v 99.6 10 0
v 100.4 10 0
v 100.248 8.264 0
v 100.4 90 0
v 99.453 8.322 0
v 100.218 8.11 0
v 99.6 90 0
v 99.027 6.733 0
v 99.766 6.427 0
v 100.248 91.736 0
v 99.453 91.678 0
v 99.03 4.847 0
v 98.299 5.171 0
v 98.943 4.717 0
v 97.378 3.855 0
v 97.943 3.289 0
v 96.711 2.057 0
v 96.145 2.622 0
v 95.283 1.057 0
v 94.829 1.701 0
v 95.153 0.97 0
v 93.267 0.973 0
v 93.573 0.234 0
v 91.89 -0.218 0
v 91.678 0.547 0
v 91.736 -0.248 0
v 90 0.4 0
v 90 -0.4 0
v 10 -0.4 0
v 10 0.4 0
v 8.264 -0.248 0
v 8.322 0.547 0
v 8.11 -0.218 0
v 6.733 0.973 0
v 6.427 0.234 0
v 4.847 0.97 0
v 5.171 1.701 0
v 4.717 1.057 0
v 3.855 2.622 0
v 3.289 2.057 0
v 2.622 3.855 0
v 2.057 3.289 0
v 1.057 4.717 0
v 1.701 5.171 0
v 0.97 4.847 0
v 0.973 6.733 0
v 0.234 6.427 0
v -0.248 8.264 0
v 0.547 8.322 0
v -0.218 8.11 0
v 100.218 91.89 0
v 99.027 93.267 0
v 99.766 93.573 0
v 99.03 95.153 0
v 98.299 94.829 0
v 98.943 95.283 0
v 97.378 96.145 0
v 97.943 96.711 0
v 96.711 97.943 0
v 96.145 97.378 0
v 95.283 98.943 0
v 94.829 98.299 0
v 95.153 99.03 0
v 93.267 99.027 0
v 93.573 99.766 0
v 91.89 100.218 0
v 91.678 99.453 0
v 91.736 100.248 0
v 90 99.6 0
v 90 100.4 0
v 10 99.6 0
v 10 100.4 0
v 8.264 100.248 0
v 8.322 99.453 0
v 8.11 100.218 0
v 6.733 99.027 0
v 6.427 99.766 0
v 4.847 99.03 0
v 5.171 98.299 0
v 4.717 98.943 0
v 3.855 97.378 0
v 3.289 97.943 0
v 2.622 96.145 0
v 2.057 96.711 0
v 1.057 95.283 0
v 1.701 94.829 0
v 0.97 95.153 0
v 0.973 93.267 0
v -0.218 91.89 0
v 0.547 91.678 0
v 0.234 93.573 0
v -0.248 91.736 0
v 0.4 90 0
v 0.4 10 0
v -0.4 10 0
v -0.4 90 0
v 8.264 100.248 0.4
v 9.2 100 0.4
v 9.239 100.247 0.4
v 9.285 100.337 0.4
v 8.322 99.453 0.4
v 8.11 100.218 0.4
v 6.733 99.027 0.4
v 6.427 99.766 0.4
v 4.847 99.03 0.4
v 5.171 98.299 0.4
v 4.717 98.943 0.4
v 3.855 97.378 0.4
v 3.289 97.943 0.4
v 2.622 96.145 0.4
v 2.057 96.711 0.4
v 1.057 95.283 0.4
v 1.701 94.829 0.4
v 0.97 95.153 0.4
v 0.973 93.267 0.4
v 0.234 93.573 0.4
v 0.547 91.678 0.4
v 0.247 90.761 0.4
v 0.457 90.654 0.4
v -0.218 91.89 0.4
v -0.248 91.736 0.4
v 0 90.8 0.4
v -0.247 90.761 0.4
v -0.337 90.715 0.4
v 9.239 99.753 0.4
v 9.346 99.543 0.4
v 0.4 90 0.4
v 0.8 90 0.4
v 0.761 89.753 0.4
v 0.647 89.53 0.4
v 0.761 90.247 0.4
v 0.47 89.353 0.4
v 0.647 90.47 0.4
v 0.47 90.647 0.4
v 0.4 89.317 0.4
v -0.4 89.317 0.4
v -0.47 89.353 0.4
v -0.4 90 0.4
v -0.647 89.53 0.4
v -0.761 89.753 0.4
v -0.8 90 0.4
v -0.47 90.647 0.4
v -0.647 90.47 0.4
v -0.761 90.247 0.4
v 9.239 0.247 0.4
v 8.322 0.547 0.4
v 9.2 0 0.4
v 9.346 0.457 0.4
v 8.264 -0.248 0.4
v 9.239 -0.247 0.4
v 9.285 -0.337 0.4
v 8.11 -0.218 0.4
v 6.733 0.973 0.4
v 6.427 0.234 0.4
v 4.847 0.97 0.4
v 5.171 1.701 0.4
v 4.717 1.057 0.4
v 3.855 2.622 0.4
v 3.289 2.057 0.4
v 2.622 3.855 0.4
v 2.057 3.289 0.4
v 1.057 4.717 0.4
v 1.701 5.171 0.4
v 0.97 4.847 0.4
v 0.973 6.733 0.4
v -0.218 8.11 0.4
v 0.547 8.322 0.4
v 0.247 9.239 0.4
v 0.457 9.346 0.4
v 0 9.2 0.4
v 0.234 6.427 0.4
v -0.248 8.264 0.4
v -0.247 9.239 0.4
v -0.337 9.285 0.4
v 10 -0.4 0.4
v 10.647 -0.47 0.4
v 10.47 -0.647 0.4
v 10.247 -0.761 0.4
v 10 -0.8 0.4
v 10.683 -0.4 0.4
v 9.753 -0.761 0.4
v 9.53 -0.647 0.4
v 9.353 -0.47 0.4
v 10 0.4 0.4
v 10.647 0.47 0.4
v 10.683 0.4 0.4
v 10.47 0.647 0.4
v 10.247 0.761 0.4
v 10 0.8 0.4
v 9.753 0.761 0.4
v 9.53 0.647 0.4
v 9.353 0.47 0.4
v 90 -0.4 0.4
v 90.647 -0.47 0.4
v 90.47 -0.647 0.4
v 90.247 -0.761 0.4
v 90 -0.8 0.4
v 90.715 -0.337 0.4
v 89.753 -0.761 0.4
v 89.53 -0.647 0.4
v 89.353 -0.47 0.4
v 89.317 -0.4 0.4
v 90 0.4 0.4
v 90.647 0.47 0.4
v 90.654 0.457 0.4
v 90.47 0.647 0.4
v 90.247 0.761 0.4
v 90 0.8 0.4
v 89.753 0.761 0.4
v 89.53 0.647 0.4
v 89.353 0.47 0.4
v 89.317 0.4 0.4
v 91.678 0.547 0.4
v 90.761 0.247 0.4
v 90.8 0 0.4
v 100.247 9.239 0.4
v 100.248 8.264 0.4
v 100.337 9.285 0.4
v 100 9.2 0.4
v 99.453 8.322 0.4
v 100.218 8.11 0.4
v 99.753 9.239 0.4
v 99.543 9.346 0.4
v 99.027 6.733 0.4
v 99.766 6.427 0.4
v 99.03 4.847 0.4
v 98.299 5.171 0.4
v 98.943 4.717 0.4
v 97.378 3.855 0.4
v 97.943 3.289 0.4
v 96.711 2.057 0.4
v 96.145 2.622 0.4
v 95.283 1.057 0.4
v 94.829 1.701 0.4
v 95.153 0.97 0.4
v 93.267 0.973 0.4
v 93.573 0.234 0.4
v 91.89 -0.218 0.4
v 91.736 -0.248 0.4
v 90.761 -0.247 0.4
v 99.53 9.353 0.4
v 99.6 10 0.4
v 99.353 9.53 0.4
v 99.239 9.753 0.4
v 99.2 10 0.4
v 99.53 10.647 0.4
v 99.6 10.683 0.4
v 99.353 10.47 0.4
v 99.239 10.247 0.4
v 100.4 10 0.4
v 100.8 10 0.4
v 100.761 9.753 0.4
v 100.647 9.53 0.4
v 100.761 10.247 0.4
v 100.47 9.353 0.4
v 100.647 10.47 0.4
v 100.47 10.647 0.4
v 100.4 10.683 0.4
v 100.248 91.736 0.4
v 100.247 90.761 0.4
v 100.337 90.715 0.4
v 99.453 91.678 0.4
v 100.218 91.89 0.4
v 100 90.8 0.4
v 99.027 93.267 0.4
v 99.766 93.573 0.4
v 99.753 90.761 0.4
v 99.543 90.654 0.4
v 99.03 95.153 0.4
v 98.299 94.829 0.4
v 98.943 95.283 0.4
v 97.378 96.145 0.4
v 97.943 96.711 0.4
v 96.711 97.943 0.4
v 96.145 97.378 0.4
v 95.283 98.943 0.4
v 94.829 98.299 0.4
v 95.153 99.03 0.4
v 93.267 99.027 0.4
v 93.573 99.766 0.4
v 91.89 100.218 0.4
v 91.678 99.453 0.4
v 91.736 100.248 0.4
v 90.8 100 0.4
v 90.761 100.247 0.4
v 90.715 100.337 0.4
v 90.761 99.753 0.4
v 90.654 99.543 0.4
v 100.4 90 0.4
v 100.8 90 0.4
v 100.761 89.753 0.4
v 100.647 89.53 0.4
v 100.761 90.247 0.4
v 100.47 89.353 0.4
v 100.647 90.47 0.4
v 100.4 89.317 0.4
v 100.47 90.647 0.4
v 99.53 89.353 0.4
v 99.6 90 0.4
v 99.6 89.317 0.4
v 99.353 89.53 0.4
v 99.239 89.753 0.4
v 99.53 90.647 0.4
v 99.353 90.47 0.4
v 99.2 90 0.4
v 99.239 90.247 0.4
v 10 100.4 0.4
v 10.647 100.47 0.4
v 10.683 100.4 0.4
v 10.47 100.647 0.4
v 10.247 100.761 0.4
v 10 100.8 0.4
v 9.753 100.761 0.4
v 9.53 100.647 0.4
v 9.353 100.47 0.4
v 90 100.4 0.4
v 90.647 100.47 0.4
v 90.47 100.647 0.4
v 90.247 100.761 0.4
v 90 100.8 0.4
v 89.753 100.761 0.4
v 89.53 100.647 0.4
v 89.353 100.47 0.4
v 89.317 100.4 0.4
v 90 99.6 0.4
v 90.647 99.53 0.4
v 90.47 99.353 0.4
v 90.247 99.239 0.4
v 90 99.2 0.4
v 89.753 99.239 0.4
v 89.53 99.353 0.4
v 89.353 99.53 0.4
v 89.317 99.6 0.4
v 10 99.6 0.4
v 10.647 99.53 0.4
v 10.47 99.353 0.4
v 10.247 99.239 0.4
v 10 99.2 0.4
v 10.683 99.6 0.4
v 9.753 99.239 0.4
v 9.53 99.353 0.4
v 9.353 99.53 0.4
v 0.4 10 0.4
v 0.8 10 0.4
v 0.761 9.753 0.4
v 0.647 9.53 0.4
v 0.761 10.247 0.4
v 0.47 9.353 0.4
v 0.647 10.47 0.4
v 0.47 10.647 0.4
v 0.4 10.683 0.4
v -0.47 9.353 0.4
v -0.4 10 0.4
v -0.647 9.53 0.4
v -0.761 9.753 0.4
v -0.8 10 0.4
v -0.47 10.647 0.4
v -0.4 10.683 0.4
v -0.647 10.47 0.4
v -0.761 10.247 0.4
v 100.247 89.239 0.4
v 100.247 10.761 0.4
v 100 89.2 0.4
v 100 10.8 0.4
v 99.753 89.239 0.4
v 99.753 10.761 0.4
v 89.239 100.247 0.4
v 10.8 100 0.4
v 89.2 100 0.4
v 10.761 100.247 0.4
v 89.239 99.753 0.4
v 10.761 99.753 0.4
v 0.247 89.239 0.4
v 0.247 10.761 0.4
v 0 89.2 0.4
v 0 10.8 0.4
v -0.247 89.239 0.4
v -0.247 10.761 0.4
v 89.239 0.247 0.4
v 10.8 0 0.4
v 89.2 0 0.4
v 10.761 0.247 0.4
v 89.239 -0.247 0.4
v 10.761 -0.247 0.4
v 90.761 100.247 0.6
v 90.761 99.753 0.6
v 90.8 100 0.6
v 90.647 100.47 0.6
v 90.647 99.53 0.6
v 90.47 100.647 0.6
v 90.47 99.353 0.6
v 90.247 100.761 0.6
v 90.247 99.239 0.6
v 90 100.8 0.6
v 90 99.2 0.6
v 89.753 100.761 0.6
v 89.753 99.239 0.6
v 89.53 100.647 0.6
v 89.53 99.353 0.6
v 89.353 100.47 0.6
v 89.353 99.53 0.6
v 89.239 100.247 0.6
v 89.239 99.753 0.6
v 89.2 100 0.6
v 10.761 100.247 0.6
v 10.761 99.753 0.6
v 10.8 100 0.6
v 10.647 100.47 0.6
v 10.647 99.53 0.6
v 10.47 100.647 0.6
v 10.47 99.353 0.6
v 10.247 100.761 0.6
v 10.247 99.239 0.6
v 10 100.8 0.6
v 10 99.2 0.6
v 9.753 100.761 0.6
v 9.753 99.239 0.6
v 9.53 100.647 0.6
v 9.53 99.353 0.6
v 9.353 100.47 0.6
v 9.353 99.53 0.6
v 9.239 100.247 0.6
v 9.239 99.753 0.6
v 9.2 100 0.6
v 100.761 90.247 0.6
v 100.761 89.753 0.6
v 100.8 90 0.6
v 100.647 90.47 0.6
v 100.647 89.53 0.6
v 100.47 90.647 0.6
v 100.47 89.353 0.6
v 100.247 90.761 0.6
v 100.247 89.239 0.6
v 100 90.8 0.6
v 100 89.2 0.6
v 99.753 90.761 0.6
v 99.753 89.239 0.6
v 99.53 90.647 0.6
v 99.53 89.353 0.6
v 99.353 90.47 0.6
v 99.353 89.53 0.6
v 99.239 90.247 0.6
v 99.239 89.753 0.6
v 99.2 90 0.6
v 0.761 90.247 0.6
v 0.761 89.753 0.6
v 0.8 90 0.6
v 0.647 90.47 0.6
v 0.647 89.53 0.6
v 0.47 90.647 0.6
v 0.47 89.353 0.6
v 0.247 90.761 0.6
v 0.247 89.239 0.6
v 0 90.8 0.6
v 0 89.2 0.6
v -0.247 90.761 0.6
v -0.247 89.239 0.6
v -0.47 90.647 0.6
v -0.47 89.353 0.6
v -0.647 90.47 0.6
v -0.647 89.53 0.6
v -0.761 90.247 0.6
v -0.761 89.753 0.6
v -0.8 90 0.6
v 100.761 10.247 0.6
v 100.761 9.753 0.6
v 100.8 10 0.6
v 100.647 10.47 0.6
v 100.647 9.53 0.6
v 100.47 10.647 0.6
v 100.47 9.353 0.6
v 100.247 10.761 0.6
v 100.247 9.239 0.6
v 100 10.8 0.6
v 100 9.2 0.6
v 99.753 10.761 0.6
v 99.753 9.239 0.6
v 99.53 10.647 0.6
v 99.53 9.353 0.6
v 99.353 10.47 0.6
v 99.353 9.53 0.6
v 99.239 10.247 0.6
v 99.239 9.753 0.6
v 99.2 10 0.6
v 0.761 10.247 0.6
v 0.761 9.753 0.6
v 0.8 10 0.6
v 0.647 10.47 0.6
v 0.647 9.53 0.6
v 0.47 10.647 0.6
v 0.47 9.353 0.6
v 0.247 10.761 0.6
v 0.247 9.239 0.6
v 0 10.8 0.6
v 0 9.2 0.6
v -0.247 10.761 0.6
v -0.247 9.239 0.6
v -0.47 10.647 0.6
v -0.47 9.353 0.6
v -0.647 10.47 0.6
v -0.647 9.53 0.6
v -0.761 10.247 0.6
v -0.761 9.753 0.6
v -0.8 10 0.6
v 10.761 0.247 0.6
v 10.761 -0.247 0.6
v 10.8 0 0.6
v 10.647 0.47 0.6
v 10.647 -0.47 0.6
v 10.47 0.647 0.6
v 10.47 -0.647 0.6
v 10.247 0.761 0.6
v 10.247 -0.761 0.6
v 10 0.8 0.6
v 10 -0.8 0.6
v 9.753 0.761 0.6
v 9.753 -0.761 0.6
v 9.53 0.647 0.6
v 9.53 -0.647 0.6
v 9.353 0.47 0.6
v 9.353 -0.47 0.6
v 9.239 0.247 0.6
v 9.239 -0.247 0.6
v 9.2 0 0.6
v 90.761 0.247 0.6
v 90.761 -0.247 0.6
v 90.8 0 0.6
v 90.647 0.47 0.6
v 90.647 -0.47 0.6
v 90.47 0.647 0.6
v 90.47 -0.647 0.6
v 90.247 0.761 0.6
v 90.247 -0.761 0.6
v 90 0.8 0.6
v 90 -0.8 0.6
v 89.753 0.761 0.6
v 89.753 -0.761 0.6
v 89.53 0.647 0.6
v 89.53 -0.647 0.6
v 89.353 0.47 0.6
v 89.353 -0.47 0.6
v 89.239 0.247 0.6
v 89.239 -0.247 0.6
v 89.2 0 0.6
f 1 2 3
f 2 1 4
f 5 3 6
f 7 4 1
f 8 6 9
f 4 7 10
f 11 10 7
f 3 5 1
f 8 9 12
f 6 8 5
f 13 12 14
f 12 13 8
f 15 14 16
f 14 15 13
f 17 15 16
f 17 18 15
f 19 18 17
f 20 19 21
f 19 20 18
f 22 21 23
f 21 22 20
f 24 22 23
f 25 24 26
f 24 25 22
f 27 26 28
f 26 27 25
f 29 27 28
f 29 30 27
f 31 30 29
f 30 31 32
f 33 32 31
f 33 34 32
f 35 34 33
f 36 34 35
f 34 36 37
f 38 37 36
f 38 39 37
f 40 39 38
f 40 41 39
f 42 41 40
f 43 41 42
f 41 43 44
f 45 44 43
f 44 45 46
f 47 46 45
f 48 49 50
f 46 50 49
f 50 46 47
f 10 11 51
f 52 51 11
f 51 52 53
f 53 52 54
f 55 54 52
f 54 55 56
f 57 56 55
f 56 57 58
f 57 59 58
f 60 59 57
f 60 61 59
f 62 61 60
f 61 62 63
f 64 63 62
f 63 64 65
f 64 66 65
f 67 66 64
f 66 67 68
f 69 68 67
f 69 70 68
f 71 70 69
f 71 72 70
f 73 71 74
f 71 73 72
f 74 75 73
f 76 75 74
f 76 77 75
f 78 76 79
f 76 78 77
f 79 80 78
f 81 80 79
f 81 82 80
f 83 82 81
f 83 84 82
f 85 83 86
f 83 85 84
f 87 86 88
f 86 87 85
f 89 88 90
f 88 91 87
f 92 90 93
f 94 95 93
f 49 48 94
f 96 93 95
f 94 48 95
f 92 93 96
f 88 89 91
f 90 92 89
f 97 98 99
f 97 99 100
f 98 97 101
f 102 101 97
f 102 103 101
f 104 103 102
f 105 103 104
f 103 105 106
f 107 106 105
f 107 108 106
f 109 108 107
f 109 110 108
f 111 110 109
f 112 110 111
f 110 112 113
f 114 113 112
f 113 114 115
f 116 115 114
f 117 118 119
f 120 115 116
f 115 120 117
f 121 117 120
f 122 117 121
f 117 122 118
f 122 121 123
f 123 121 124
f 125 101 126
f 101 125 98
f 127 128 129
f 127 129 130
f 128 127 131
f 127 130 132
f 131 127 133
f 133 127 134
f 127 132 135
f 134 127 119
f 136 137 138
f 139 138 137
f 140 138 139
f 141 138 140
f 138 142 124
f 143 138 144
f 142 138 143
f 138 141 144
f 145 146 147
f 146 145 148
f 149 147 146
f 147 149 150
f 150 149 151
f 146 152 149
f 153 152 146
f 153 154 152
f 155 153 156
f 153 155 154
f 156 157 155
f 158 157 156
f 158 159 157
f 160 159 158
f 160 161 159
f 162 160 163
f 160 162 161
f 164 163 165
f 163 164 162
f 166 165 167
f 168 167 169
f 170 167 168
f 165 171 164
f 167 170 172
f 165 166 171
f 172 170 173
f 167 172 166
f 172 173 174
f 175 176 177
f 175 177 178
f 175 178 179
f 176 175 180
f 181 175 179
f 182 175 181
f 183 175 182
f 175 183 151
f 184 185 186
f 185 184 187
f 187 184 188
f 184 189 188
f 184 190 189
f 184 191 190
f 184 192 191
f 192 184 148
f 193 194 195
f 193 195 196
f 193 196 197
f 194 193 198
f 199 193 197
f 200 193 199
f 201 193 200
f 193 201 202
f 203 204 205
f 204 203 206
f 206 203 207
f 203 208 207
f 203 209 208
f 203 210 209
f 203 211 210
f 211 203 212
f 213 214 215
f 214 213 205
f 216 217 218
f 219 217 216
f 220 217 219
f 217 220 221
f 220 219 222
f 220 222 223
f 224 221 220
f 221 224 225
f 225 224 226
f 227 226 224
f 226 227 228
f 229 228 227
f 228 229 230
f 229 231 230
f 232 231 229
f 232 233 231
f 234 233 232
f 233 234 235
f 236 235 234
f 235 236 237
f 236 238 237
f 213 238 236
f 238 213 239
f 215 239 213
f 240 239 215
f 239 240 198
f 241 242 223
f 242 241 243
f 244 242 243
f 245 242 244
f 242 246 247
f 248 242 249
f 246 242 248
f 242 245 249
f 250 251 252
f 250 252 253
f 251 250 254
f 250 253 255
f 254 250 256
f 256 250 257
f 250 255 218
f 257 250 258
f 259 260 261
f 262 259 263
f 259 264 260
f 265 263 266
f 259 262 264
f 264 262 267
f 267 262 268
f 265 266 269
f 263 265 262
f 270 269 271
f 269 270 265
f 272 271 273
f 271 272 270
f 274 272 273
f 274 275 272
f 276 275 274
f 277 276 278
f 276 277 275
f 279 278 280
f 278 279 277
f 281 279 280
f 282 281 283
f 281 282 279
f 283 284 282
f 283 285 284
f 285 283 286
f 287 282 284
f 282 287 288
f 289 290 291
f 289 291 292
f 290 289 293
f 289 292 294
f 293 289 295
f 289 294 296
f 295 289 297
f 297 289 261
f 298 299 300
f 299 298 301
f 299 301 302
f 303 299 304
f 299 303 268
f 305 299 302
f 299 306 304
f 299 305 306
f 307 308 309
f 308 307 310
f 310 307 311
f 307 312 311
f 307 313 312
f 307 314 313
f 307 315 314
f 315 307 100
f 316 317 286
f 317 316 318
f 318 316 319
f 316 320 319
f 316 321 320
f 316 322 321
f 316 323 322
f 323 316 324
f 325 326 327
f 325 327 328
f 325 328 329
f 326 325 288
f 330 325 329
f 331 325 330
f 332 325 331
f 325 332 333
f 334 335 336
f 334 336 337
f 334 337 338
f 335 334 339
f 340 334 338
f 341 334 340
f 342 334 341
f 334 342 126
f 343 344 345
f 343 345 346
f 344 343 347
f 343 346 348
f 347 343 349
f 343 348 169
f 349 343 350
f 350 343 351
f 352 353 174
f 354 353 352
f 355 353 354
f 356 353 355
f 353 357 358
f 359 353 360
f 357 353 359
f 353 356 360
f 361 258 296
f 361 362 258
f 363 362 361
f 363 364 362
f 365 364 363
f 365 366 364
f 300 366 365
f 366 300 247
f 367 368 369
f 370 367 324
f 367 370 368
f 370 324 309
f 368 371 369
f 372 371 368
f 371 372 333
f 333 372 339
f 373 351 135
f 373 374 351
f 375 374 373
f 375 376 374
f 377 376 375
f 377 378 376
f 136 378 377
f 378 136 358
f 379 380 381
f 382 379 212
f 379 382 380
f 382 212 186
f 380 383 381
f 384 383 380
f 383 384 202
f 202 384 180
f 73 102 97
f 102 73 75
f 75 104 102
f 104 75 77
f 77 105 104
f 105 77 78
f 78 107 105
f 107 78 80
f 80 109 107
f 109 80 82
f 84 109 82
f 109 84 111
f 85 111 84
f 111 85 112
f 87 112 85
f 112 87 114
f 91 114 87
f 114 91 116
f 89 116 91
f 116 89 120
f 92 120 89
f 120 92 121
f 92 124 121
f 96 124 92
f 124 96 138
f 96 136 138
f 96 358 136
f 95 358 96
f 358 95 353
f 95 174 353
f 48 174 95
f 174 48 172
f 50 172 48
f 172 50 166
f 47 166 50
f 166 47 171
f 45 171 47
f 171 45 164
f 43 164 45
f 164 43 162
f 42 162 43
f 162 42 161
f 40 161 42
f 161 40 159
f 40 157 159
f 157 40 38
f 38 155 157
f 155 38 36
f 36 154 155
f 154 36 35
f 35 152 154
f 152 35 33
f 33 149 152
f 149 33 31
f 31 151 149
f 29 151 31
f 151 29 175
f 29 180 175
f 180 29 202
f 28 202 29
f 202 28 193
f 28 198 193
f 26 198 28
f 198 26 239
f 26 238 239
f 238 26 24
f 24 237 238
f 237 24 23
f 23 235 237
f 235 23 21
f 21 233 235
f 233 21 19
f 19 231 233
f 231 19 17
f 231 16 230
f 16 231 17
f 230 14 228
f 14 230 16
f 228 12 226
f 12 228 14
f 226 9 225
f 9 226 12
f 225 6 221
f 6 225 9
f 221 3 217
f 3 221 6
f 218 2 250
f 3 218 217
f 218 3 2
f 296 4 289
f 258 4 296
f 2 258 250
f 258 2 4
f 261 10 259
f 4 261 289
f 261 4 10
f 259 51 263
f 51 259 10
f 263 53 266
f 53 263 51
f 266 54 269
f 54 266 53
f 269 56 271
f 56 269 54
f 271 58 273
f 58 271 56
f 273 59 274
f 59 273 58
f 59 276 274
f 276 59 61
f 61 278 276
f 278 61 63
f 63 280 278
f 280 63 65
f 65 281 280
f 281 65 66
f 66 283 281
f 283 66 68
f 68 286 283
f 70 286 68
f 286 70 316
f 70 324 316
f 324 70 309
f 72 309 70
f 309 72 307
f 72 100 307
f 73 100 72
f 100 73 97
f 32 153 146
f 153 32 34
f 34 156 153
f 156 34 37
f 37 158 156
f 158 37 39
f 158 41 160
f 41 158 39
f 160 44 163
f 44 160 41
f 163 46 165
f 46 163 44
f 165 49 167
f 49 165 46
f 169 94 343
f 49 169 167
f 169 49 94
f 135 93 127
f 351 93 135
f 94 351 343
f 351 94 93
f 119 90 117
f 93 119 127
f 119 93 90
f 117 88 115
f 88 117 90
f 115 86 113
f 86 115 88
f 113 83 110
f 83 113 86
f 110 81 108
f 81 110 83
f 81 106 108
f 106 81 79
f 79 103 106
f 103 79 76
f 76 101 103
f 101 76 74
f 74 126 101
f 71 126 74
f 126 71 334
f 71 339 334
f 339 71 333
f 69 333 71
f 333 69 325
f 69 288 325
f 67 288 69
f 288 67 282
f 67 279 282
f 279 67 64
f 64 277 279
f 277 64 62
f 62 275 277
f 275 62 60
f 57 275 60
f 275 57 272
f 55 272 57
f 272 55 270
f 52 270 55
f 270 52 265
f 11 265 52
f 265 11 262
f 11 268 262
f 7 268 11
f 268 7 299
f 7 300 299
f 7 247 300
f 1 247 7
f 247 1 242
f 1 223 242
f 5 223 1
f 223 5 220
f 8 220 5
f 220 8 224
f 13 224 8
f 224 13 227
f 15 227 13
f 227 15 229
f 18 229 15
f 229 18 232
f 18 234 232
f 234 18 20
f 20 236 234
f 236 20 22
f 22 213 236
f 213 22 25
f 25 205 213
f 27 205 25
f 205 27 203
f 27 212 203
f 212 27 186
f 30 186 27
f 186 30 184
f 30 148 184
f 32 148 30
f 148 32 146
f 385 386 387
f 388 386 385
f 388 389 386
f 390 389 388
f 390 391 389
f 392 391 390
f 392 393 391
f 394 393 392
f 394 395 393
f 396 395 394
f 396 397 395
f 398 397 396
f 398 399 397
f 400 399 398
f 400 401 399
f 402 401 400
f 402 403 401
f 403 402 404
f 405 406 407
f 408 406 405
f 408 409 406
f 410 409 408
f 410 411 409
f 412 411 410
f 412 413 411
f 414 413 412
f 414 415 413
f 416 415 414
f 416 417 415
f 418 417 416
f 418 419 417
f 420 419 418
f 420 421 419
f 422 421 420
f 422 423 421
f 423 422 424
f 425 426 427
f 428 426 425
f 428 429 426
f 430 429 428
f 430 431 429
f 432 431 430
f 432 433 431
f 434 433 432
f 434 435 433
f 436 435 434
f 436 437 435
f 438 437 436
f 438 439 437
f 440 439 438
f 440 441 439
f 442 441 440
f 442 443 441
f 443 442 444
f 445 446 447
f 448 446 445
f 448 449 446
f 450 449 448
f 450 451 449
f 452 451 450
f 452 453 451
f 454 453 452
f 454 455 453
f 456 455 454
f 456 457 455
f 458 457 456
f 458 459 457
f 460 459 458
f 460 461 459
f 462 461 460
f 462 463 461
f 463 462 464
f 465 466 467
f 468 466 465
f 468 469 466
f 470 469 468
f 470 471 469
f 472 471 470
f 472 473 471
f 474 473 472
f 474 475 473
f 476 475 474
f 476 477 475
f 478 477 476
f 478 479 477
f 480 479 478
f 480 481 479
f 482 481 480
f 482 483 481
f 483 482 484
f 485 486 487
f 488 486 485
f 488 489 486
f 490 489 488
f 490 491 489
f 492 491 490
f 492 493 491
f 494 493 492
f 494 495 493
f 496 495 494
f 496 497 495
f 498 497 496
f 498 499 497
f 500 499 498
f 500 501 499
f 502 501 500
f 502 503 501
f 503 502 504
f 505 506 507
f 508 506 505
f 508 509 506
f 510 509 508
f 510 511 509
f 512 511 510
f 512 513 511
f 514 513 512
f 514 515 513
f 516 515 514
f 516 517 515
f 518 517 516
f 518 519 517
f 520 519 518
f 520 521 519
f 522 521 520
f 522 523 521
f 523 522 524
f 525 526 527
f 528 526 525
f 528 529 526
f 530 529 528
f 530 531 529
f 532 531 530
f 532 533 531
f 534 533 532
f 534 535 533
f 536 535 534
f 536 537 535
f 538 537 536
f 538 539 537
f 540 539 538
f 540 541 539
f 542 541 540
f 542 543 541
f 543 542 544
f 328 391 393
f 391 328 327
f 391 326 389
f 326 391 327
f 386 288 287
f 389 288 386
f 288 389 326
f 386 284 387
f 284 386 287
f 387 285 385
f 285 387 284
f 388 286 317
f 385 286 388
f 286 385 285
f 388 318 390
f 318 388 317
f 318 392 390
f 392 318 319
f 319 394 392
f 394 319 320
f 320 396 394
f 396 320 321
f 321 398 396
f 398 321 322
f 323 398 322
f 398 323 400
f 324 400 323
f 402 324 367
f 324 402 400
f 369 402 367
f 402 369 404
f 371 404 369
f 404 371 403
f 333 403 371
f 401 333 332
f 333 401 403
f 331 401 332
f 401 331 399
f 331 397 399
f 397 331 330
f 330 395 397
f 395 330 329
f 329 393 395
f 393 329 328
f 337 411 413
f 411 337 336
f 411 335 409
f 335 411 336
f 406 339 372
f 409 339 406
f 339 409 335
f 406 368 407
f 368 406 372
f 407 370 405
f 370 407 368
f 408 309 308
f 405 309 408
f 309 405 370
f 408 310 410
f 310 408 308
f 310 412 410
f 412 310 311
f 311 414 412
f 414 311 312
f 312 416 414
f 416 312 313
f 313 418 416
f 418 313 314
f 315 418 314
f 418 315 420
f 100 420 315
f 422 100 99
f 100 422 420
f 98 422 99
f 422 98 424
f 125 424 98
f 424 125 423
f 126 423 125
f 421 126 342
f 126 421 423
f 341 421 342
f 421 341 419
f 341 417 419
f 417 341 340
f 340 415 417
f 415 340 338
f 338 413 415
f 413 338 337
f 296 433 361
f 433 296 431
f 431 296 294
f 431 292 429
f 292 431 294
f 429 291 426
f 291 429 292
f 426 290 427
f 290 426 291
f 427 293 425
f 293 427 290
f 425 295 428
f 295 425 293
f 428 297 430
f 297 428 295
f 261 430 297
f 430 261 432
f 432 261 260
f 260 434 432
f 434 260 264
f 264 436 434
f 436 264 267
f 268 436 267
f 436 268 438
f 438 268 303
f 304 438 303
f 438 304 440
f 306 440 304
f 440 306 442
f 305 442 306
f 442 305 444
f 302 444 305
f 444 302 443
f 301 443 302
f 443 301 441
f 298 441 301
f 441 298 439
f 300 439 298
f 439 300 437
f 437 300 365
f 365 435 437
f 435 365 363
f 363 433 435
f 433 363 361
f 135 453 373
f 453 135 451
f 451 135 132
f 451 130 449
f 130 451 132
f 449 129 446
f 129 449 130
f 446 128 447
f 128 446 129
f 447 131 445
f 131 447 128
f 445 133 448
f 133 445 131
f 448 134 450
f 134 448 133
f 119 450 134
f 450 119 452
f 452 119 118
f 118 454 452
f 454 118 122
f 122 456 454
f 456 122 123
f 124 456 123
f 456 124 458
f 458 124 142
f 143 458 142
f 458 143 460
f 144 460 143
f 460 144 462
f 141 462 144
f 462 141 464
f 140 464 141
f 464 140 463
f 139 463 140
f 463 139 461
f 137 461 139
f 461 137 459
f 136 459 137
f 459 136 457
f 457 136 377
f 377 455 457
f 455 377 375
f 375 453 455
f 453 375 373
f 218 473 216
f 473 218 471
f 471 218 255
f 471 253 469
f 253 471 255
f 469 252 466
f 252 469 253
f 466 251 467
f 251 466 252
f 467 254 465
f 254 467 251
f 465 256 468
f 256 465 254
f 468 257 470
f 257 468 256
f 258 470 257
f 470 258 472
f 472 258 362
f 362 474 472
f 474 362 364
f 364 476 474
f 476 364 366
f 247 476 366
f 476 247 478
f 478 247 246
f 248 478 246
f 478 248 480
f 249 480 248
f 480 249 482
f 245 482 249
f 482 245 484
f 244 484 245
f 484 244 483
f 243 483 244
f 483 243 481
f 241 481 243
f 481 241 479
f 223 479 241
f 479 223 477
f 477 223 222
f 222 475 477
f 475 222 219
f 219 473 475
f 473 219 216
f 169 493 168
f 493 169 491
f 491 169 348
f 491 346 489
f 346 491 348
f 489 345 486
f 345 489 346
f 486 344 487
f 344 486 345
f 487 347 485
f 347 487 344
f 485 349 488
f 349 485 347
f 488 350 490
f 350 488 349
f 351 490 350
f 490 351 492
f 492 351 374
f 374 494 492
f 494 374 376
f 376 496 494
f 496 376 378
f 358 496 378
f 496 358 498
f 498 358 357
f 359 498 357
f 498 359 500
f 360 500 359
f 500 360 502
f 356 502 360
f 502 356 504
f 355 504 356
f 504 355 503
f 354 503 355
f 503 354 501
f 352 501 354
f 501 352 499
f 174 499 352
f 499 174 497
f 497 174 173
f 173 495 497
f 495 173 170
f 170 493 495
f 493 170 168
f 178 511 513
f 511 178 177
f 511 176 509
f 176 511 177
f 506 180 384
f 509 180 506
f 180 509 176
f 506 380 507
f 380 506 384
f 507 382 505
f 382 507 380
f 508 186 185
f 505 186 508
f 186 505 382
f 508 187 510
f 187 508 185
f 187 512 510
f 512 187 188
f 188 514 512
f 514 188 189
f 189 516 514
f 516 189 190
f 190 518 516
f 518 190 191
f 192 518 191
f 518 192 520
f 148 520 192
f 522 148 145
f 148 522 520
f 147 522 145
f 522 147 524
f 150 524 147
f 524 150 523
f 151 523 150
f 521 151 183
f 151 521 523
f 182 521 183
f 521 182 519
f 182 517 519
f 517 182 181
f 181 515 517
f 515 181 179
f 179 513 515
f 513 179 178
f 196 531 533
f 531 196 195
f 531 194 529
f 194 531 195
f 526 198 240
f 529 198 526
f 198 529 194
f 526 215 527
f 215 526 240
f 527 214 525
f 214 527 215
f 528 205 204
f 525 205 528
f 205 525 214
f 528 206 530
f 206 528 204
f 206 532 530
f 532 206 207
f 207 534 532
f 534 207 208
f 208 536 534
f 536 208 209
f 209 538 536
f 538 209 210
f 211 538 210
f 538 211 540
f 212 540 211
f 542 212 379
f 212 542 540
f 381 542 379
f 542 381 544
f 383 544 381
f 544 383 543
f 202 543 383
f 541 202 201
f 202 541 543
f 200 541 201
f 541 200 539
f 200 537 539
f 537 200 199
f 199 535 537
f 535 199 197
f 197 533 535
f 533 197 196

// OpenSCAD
//////////////////////////////////////////////////////////////////////
// LibFile: vertex_polygon_workbench_wrapper_contract.scad
// Project: Strap Bender
// FileGroup: Direct-Open F5 Contract Test
// FileSummary: Executes the Vertex Polygon wrapper through main.scad.
//////////////////////////////////////////////////////////////////////

include <../workbenches/vertex-polygon.scad>

echo("STRAP BENDER VERTEX-POLYGON WORKBENCH WRAPPER CONTRACT: PASS");
